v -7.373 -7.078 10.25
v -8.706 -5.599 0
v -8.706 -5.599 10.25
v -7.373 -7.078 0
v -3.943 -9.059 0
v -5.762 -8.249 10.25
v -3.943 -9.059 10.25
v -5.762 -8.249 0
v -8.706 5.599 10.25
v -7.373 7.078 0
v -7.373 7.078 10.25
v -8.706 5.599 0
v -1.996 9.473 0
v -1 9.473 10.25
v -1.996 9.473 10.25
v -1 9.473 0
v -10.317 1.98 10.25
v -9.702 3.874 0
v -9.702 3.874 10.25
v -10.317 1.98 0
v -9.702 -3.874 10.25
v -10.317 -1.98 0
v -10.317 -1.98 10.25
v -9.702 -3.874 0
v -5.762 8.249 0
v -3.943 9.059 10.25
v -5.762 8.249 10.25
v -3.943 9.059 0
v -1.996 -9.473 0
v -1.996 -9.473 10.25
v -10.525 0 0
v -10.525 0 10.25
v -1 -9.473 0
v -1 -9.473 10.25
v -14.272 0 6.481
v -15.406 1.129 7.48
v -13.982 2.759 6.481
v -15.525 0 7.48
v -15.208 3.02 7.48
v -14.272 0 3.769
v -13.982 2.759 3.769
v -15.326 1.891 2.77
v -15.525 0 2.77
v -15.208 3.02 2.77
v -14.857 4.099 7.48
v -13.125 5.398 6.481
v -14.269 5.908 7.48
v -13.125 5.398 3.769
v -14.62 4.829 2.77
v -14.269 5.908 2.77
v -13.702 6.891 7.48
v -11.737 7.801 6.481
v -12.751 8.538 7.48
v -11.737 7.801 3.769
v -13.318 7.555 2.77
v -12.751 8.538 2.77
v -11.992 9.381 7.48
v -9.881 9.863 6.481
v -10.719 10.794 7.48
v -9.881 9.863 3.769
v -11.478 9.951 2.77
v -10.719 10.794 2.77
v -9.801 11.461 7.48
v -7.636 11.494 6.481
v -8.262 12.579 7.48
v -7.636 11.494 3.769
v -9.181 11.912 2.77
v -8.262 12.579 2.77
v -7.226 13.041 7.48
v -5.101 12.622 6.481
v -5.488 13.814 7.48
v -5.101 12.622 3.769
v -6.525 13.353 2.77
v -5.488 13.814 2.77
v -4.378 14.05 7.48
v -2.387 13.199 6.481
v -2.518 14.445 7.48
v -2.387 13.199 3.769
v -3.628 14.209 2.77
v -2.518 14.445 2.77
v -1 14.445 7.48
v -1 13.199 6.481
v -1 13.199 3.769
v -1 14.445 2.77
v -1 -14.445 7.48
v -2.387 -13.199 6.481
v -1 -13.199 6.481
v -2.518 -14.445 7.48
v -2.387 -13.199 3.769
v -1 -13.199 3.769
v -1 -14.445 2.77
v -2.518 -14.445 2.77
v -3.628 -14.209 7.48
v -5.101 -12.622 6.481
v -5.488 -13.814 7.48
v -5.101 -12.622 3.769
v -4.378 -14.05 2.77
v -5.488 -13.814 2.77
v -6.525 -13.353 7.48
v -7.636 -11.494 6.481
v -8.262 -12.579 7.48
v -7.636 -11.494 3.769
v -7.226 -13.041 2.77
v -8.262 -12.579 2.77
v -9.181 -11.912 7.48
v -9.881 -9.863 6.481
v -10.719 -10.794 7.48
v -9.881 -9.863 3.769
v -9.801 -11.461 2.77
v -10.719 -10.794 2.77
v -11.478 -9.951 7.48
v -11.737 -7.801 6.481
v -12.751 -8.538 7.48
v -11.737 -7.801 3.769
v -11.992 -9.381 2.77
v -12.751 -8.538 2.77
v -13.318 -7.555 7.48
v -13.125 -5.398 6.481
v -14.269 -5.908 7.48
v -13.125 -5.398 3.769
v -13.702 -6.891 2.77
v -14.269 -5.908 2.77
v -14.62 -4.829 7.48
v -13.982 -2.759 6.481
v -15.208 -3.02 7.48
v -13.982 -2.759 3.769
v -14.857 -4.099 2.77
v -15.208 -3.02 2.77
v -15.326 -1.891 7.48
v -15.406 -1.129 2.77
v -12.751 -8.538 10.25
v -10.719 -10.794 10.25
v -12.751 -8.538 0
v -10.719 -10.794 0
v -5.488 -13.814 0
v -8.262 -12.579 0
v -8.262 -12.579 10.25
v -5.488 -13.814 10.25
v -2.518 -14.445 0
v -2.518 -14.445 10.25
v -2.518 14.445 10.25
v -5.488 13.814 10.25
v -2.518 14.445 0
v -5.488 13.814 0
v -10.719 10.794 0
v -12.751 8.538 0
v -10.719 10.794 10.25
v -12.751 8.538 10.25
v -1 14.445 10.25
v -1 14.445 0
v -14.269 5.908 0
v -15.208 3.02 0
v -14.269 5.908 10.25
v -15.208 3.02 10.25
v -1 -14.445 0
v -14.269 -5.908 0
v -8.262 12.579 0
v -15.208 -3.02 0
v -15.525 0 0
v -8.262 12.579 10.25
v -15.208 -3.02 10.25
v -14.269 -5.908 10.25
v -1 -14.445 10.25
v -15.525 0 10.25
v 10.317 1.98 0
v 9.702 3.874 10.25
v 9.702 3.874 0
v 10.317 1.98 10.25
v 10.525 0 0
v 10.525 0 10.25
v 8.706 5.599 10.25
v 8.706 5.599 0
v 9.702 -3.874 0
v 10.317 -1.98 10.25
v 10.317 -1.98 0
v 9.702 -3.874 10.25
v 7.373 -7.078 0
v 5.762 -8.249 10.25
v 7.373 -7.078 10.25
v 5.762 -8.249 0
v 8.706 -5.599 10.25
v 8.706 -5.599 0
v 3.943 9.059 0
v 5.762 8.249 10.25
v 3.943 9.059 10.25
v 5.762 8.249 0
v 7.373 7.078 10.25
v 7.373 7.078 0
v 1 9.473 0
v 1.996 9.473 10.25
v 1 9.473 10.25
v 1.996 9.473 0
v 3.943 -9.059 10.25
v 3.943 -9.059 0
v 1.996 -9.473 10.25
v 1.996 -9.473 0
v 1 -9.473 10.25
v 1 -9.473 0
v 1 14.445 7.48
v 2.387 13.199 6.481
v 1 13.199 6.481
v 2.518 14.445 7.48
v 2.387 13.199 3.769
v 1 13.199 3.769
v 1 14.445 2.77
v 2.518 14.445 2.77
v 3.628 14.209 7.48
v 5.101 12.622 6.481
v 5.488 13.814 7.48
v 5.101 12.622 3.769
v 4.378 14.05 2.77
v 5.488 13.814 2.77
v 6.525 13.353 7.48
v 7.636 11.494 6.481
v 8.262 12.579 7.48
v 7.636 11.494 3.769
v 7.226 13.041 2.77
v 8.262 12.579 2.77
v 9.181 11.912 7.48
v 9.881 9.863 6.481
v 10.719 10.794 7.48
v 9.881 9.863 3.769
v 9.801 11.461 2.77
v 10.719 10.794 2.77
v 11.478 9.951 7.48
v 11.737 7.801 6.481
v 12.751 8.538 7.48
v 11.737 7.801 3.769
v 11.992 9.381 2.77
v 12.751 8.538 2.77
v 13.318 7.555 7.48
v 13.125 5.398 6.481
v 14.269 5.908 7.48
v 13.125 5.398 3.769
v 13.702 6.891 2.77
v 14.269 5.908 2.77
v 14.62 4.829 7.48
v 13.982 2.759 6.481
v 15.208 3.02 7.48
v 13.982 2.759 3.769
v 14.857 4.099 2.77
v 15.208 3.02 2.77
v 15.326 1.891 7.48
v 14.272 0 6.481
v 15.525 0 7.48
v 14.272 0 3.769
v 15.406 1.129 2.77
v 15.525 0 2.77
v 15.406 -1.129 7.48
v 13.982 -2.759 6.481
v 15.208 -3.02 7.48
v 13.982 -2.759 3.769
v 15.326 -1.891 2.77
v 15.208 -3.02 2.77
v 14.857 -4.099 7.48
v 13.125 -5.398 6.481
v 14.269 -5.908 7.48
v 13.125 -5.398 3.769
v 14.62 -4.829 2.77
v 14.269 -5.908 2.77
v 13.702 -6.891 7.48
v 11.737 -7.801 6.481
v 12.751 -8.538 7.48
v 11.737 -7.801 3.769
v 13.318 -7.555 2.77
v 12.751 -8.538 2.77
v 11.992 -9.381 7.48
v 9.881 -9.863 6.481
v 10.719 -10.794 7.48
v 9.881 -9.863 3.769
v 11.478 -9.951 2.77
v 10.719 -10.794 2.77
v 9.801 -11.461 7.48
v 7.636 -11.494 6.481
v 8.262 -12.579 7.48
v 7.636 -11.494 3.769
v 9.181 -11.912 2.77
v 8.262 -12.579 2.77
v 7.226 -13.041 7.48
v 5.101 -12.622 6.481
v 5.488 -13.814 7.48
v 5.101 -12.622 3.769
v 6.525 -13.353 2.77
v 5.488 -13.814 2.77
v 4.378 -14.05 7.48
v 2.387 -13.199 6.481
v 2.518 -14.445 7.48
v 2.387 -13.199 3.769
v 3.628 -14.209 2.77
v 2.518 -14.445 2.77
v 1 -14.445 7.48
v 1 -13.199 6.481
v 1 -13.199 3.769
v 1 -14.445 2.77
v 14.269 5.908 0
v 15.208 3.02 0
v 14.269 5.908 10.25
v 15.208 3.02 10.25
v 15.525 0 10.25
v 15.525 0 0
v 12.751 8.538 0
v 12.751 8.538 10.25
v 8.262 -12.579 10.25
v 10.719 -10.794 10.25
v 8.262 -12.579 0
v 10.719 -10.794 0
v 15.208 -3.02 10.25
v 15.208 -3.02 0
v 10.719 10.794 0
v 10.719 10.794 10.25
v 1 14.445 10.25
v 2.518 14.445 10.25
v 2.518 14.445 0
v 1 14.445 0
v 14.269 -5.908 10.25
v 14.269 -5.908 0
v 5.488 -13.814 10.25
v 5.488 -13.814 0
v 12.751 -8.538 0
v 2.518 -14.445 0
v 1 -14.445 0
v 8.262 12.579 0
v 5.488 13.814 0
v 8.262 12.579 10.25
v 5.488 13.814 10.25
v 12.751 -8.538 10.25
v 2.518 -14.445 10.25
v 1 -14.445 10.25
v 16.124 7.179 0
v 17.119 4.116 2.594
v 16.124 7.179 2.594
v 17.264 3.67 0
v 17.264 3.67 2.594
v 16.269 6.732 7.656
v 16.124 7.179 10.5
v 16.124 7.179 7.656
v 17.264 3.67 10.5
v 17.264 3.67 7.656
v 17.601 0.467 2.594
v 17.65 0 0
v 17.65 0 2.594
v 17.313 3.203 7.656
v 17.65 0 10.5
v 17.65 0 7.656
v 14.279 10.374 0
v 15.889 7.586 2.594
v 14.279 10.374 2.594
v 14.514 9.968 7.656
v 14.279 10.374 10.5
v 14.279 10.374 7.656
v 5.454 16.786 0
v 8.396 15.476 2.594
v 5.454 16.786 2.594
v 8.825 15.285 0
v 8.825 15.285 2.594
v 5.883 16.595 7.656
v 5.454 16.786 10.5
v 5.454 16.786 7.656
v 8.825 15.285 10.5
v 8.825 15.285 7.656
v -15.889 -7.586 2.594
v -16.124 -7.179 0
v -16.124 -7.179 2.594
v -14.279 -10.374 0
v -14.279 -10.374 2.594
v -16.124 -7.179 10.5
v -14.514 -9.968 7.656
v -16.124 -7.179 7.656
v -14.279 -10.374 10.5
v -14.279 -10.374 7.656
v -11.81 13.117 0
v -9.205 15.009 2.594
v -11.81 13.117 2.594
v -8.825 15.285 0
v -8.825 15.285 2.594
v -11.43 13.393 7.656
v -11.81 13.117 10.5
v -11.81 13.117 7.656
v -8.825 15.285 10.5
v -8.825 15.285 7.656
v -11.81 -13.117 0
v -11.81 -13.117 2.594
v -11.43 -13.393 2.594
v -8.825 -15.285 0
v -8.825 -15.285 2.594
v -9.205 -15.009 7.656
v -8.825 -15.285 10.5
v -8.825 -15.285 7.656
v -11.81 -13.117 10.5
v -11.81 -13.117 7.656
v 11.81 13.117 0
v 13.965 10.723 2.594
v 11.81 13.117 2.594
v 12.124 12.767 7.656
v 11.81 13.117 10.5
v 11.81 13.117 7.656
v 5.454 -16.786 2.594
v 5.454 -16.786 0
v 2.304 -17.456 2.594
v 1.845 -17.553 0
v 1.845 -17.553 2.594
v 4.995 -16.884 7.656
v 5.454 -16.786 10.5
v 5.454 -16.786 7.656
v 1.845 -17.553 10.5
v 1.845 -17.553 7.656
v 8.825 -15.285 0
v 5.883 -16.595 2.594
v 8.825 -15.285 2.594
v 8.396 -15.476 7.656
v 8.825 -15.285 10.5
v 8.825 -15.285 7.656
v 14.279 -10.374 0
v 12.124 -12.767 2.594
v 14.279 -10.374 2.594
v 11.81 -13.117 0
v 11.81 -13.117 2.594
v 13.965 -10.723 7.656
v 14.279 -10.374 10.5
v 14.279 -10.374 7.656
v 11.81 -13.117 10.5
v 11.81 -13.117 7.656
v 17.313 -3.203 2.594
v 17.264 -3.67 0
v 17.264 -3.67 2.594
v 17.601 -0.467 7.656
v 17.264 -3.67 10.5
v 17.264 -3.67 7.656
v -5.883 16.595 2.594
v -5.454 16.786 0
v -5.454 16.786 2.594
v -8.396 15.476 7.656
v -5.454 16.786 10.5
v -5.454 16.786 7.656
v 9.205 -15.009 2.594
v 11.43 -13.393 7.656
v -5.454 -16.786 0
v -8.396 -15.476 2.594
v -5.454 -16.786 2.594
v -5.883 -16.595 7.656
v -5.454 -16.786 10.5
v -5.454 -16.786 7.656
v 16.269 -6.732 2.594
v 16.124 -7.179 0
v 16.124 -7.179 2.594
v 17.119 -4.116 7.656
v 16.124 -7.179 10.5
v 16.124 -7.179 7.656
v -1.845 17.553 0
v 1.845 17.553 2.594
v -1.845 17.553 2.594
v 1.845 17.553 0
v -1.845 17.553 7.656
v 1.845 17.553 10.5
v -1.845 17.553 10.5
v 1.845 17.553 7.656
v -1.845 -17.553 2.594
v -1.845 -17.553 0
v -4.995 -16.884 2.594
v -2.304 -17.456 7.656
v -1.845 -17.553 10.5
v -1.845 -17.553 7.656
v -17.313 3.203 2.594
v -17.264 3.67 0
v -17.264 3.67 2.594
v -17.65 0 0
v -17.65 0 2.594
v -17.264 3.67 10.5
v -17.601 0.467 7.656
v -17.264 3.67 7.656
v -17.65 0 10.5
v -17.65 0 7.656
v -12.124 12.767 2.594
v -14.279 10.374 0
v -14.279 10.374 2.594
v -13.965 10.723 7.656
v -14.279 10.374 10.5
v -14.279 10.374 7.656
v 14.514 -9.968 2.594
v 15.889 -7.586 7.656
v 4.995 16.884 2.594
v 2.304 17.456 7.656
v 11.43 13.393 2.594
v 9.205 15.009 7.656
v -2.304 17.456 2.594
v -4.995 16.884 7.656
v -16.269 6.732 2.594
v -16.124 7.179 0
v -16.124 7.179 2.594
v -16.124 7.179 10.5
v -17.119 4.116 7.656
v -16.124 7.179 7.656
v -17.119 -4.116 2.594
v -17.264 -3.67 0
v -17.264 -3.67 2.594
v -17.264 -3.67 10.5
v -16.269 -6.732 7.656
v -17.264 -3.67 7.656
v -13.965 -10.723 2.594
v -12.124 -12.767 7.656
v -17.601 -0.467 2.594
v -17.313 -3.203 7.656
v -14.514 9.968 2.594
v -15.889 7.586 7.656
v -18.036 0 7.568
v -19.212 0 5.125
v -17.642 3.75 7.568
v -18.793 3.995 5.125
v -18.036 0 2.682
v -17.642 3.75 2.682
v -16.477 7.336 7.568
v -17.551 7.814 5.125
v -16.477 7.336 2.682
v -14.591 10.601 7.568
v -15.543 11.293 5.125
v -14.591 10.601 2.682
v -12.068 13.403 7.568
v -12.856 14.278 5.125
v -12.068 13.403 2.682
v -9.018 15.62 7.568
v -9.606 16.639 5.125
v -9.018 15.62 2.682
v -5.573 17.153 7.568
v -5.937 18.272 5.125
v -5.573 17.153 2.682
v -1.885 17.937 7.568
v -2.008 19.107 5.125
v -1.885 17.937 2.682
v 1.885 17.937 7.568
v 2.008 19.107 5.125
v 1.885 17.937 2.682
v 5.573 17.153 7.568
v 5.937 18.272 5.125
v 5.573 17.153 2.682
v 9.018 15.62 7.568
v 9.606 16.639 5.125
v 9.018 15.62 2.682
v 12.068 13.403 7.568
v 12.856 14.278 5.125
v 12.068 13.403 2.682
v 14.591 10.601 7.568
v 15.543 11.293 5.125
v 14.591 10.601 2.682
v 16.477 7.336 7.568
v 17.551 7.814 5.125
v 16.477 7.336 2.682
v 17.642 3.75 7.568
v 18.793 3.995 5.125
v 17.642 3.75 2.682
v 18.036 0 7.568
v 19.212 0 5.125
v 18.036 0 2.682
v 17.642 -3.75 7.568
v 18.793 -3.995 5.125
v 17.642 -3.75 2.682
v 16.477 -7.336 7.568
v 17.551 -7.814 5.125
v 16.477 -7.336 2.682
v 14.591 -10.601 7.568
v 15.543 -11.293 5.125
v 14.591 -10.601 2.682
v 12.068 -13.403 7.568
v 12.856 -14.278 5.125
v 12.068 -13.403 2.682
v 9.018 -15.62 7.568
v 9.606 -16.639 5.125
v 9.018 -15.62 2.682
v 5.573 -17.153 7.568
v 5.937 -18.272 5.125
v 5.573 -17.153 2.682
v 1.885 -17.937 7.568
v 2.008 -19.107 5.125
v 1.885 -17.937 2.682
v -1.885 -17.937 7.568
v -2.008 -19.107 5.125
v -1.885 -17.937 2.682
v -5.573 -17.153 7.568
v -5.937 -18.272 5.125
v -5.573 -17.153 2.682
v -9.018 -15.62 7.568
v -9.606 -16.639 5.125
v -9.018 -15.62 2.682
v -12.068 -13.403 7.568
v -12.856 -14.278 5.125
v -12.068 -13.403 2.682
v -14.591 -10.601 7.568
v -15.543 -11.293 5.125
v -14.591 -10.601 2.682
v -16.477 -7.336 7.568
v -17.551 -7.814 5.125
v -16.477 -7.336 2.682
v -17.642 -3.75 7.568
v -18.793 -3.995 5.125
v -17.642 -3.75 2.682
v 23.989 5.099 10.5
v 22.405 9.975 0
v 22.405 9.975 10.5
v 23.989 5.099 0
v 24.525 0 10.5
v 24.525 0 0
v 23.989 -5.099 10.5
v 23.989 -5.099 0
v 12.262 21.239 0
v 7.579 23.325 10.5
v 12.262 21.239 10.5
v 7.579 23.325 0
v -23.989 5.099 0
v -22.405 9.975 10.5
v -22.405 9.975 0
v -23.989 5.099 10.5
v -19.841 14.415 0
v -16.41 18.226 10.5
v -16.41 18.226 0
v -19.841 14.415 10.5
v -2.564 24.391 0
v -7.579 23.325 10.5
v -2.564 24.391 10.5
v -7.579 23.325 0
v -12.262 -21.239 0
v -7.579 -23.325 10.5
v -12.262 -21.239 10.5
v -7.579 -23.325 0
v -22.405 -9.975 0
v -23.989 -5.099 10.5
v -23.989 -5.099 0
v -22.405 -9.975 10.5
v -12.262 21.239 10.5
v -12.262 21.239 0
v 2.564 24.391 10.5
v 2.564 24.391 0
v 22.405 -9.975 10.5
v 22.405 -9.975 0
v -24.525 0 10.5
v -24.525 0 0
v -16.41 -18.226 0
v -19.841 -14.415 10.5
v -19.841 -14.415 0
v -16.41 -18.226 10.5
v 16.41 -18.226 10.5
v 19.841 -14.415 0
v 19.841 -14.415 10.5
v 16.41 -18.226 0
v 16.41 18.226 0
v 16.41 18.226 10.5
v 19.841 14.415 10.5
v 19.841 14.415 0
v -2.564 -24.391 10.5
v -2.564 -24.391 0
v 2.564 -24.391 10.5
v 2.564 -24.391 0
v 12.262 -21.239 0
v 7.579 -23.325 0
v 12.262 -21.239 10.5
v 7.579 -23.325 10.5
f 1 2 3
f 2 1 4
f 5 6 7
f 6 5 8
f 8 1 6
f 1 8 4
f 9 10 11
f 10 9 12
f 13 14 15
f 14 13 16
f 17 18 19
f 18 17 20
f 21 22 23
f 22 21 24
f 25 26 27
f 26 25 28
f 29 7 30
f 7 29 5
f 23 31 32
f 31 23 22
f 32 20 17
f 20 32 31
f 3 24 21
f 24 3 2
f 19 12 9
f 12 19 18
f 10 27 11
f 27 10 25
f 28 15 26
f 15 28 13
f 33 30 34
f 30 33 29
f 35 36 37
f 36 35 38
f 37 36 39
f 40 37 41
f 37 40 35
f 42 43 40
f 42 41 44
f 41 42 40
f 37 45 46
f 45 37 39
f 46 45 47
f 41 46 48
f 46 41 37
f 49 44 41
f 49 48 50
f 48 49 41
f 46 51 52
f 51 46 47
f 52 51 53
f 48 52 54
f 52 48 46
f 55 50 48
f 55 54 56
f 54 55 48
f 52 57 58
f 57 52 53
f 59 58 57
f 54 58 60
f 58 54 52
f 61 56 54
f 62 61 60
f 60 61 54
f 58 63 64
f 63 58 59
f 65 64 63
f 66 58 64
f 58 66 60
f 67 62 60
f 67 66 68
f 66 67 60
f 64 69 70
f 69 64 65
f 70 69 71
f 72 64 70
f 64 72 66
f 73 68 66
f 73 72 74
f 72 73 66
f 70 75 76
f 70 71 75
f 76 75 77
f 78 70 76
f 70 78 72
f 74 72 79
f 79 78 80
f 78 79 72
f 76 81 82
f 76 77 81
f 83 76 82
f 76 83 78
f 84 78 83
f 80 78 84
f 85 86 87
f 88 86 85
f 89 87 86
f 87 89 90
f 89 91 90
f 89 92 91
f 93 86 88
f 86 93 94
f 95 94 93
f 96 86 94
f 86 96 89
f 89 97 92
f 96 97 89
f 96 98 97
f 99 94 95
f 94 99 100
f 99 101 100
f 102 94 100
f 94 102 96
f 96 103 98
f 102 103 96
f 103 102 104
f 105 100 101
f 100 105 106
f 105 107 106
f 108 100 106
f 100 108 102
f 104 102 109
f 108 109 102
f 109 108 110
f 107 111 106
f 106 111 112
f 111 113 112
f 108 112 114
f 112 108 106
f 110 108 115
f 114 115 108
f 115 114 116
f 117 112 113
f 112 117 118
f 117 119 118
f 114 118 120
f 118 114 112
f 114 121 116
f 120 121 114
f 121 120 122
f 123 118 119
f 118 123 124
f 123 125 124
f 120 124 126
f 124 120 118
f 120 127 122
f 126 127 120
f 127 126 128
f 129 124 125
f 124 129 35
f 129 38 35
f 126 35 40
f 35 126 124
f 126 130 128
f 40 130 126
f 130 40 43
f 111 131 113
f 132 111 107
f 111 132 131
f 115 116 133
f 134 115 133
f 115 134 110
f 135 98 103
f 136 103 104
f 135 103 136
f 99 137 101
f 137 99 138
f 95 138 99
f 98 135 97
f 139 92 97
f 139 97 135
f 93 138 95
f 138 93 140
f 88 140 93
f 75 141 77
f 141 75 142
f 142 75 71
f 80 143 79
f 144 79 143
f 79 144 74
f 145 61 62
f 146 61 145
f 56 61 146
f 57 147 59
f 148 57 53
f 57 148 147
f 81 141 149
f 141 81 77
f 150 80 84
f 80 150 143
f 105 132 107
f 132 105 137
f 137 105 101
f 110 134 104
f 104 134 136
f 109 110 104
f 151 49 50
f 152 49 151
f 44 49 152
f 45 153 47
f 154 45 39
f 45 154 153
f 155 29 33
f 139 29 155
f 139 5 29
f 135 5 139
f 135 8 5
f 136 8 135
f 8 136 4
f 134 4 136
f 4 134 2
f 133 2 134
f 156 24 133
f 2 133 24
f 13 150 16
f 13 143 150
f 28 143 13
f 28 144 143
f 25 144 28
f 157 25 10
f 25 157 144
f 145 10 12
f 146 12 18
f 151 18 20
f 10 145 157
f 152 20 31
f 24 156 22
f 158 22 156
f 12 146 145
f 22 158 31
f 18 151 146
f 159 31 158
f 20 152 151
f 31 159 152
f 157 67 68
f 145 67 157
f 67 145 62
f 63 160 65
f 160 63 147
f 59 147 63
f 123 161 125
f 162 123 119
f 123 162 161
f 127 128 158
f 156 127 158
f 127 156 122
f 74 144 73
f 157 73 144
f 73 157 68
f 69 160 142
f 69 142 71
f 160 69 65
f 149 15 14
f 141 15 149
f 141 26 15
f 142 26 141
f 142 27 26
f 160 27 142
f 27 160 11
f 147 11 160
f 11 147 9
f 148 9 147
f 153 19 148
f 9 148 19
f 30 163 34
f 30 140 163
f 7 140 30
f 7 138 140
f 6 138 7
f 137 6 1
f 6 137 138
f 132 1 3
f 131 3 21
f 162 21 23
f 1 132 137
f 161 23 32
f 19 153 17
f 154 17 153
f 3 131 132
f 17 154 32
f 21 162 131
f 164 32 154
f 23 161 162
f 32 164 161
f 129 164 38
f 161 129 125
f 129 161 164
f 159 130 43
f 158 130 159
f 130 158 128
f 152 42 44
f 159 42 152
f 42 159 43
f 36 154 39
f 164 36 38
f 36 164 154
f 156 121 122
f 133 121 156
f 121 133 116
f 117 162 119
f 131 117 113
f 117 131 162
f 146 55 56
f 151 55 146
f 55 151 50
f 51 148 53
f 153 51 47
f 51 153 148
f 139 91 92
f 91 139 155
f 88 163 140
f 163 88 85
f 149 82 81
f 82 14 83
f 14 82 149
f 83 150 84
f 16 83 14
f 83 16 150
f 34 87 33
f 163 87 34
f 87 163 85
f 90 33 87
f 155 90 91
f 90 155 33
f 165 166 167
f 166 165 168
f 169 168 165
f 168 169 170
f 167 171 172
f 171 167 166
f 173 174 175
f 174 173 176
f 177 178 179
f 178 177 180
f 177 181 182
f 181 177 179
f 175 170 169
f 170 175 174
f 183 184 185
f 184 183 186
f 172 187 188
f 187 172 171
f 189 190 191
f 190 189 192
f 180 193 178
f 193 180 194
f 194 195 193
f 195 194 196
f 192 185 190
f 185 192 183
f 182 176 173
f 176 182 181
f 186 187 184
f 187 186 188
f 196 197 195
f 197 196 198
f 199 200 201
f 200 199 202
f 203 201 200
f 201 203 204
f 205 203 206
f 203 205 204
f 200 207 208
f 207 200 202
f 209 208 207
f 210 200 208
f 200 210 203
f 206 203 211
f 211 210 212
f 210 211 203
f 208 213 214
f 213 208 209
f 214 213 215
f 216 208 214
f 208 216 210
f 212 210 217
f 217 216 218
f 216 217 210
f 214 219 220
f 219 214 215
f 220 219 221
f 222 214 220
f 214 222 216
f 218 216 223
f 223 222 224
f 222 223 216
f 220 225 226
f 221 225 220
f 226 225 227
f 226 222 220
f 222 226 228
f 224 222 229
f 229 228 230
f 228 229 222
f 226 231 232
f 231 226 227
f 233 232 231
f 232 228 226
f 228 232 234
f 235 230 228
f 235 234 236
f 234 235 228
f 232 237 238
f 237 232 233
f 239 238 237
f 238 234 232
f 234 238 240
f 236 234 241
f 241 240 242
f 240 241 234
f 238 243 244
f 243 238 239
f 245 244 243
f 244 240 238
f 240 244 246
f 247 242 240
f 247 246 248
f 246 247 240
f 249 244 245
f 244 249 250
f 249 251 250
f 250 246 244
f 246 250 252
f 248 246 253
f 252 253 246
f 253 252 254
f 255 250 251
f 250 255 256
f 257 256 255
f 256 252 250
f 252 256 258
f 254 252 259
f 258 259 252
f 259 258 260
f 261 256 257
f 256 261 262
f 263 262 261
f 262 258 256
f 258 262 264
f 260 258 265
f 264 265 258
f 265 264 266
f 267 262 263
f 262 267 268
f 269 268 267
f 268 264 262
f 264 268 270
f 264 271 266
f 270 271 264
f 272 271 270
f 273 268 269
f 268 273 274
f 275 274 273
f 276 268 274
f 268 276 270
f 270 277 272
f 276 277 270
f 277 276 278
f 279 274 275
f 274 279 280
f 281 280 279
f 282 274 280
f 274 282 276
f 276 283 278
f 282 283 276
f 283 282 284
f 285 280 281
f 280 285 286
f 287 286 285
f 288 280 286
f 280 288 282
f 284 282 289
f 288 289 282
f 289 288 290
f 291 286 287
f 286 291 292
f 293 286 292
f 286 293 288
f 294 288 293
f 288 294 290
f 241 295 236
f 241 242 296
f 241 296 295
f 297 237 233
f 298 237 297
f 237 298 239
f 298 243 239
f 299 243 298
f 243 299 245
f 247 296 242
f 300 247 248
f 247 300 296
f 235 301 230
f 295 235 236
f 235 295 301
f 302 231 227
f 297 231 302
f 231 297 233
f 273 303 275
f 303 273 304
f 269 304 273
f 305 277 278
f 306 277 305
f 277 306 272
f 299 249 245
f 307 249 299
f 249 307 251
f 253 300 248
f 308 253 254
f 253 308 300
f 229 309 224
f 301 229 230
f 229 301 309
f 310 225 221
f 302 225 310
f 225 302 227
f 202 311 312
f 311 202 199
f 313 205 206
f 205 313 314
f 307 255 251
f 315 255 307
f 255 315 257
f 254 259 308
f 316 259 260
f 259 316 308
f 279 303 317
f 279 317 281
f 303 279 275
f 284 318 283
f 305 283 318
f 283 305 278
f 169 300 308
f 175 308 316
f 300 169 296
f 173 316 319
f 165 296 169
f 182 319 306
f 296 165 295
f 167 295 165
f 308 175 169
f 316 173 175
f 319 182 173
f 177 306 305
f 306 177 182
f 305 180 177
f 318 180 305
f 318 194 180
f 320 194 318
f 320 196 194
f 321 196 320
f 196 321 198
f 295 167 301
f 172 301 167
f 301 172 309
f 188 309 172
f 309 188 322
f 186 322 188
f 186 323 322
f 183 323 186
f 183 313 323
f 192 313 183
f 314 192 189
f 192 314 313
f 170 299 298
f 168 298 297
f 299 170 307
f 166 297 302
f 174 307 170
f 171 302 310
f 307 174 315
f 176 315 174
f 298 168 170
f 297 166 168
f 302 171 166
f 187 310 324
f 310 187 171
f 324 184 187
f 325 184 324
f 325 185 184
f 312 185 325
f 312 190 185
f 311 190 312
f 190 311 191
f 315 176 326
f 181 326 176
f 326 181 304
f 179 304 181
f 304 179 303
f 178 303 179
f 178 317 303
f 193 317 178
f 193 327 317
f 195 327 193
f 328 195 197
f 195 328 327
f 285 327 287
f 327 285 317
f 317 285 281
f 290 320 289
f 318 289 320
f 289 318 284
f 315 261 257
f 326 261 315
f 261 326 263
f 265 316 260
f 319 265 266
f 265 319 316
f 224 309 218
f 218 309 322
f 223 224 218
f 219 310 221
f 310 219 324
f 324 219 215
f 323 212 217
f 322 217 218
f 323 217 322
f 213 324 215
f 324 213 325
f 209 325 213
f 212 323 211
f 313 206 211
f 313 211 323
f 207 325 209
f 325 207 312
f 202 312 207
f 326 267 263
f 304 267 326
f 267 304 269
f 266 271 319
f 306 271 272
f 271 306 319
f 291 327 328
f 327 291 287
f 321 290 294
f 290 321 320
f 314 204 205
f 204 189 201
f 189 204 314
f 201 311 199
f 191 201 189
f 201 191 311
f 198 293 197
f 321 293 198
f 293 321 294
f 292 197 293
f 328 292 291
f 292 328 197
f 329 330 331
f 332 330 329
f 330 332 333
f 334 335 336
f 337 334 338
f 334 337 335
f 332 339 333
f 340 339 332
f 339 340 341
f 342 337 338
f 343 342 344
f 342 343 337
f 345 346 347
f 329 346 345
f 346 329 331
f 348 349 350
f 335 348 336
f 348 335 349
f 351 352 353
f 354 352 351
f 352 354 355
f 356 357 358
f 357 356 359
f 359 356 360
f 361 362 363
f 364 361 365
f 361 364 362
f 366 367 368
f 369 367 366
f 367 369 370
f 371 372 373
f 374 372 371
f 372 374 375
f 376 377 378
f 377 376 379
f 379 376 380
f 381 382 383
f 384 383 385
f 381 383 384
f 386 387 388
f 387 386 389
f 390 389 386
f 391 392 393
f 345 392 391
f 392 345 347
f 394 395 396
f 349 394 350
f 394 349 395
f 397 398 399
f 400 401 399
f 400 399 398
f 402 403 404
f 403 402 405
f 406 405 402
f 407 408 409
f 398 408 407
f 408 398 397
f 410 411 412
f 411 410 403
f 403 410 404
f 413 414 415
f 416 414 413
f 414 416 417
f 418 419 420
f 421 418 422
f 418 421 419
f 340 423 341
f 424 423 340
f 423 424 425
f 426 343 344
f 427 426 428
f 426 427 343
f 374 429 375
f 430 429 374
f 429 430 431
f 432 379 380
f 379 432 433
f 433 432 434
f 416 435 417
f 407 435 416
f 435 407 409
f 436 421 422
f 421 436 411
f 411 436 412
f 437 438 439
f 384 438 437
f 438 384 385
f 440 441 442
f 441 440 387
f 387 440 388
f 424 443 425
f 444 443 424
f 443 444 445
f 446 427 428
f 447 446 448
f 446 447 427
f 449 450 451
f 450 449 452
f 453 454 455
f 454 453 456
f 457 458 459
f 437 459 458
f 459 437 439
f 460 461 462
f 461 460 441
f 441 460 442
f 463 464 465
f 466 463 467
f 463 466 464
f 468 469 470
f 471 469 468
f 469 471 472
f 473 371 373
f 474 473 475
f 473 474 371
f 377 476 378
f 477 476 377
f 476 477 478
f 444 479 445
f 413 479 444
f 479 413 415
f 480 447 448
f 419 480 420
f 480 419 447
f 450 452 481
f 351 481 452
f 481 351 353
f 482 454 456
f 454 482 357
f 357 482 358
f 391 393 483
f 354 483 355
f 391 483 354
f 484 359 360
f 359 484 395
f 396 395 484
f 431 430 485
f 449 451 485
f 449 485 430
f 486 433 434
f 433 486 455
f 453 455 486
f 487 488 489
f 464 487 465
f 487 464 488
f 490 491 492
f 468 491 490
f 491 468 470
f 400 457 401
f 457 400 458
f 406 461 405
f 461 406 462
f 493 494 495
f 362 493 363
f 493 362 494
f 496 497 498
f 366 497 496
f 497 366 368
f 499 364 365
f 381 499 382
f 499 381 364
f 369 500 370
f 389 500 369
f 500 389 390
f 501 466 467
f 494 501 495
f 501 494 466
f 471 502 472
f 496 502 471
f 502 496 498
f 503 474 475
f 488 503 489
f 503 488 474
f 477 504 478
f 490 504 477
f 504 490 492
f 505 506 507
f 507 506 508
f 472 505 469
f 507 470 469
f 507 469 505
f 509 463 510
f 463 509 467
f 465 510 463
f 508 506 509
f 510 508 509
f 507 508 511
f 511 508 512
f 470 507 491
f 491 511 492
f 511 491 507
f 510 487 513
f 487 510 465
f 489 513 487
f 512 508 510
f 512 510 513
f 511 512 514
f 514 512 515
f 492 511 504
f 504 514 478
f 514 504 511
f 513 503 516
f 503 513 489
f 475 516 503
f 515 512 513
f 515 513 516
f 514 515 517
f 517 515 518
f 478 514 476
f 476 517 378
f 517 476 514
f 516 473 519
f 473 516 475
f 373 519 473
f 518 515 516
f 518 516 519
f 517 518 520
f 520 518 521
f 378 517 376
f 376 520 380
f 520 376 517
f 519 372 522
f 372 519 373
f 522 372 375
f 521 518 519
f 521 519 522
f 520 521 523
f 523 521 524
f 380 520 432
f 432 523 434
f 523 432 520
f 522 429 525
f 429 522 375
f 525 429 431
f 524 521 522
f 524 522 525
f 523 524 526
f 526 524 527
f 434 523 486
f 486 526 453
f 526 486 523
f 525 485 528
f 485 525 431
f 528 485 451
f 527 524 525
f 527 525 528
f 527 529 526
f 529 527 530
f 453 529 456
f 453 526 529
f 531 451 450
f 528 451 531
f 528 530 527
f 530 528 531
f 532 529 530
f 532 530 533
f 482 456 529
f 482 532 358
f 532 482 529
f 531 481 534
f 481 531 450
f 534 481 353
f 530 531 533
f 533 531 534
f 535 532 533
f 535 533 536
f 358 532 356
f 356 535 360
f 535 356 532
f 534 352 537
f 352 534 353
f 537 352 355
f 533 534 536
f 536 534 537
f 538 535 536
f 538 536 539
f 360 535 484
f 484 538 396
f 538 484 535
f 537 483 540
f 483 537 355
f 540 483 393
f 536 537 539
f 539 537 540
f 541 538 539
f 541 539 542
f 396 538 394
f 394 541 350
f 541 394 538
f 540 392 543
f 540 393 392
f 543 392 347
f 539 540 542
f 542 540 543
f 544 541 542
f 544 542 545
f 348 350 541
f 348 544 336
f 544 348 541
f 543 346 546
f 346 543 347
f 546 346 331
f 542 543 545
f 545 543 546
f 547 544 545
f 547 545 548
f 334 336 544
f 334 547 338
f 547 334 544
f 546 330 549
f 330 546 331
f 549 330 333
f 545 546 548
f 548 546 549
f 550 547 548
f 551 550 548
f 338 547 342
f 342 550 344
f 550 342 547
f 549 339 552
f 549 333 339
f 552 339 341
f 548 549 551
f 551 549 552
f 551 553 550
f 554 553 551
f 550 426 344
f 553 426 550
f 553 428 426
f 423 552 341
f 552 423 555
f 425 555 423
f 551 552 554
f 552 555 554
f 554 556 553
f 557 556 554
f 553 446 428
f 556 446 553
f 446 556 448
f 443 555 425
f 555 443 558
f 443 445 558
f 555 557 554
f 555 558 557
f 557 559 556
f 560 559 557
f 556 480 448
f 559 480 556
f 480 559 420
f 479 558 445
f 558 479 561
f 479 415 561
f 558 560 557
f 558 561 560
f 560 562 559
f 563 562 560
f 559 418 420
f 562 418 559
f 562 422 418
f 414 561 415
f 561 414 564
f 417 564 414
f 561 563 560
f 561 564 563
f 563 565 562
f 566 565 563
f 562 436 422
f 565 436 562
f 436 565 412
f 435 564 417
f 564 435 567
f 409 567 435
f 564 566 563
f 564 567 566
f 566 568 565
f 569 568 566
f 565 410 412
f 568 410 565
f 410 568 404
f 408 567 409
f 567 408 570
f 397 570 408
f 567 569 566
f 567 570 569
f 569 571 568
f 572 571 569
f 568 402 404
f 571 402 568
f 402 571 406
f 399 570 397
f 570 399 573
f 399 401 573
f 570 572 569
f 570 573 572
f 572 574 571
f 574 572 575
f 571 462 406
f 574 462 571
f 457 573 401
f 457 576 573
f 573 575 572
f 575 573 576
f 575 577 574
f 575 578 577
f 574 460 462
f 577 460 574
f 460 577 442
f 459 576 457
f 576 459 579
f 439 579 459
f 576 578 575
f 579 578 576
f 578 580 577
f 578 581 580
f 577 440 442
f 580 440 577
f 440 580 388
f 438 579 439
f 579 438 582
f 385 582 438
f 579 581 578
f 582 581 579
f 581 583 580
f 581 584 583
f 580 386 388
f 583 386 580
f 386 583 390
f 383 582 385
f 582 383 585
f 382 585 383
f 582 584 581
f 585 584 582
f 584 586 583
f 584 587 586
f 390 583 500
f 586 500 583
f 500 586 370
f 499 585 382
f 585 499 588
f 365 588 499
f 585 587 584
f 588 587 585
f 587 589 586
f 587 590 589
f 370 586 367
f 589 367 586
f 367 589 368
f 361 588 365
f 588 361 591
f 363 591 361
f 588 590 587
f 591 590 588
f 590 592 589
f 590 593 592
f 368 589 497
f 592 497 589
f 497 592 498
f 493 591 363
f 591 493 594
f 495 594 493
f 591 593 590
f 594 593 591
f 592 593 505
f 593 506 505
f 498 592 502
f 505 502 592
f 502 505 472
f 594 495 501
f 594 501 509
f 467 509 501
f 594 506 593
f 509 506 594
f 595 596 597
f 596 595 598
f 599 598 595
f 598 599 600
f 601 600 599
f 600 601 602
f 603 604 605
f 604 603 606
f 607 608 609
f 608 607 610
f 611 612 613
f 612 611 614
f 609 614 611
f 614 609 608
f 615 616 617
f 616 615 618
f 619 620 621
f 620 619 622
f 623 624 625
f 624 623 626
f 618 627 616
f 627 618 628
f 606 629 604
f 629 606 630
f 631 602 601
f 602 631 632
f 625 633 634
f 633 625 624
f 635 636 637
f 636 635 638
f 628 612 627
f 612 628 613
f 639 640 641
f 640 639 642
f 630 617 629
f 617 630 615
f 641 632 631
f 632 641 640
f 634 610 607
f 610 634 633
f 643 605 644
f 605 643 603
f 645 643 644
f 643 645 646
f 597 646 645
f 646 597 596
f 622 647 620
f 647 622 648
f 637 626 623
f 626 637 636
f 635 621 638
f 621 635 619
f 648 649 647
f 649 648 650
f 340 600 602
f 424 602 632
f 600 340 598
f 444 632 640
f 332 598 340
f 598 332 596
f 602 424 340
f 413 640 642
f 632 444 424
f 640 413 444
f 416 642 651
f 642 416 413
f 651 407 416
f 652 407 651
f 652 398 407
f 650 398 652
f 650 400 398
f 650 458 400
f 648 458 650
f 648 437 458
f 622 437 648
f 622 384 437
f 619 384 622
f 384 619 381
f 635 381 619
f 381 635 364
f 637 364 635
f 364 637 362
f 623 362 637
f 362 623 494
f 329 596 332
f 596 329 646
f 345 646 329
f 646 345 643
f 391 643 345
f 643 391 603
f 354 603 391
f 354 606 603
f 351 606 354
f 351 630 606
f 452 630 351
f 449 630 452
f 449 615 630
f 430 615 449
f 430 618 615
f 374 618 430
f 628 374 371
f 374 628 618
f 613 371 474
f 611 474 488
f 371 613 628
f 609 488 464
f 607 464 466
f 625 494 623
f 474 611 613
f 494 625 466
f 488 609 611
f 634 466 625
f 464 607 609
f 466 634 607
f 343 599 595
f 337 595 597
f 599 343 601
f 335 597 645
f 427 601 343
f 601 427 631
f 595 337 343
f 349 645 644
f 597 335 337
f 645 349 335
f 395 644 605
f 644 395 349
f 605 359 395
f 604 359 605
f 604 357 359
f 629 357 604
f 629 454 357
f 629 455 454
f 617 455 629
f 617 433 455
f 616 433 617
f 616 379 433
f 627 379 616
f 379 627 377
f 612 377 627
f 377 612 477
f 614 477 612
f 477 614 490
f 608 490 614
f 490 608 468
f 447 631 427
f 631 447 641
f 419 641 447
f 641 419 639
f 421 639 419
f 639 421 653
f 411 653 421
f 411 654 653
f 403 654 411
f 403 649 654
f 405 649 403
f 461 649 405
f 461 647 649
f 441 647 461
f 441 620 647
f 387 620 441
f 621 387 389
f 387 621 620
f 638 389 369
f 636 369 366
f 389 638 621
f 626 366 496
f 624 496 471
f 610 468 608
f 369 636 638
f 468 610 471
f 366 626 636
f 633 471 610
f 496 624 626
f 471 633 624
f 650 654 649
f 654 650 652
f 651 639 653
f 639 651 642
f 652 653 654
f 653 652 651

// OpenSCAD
// file: stuff.scad
bignumber=500;

module hole(h,d,r=false,center=false){
    r=(r==false)?(d/2):r;
    cylinder(h=h,r=r,center=center,$fs=0.2);
}
module polyhole(h,d,r=false,center=false){
    r=(r==false)?(d/2):r;
    n=max(round(4*r),3);
    rotate([0,0,180])cylinder(h=h,r=r/cos(180/n),$fn=n,center=center);
}
// main file
include <stuff.scad>;
//$fa=0.1;
balldiam=6+0.25;

inner_id=3/4*25.4;	//82/2;
inner_wall=5;
inner_topwall=2;
inner_bottomwall=2; //10;

ballgroove_fn=7;

inner_height=inner_bottomwall+balldiam+inner_topwall;
inner_od=inner_id+inner_wall*2;

tubediam=7.5;//23;
tubeholder=false;
outer_topwall=3;
outer_sidewall=10;

module bearinginner(){
	difference(){
		cylinder(r=inner_od/2,h=inner_height);
		union(){
			cylinder(r=inner_id/2,h=bignumber,center=true);
			translate([0,0,inner_bottomwall+balldiam/2])
			rotate_extrude(convexity=10) translate([inner_od/2+balldiam/4,0])
				circle(r=balldiam/2,$fn=ballgroove_fn);
		}
	}
}
module half(which=0,rot=0){
	intersection(){
		child(0);
		rotate([0,0,rot])
		mirror([which,0,0]) translate([bignumber/2,0]) cube([1,1,1]*bignumber,center=true);
	}
}
module bearingouter(){
	difference(){
		union(){
			cylinder(r=inner_od/2+outer_sidewall,h=tubediam+outer_topwall);
*			translate([3/-2,inner_od/2]) cube([3,20,tubediam+outer_topwall]);
			if(tubeholder)
			translate([inner_od/2,(tubediam+outer_topwall)/-2])
				cube([tubediam+outer_topwall+outer_sidewall,tubediam+outer_topwall,tubediam+outer_topwall]);
		}
		union(){
			cylinder(r=inner_od/2+balldiam/2,h=bignumber,center=true);
			translate([0,0,inner_bottomwall+balldiam/2])
			rotate_extrude(convexity=10) translate([inner_od/2+balldiam/4,0])
				circle(r=balldiam/2,$fn=ballgroove_fn);
			if(tubeholder){
				translate([inner_od/2+outer_sidewall,0,(tubediam+outer_topwall)/2]) rotate([0,90]) cylinder(r=tubediam/2,h=bignumber);
				translate([inner_od/2+outer_sidewall+(tubediam+outer_topwall)/2,0,(tubediam+outer_topwall)/2]) rotate([90,0]) cylinder(r=3/2,h=bignumber,center=true);
			}
		}
	}
}

//for(i=[0,1]) rotate([0,0,i*180]) translate([5,0]/2) semibearinginner();
//translate([inner_od/2+balldiam/4,0,inner_bottomwall+balldiam/2]) sphere(r=6/2);
for(i=[false,true]) translate([i?1:-1,0,0])
half(i?0:1) bearinginner();
bearingouter();
